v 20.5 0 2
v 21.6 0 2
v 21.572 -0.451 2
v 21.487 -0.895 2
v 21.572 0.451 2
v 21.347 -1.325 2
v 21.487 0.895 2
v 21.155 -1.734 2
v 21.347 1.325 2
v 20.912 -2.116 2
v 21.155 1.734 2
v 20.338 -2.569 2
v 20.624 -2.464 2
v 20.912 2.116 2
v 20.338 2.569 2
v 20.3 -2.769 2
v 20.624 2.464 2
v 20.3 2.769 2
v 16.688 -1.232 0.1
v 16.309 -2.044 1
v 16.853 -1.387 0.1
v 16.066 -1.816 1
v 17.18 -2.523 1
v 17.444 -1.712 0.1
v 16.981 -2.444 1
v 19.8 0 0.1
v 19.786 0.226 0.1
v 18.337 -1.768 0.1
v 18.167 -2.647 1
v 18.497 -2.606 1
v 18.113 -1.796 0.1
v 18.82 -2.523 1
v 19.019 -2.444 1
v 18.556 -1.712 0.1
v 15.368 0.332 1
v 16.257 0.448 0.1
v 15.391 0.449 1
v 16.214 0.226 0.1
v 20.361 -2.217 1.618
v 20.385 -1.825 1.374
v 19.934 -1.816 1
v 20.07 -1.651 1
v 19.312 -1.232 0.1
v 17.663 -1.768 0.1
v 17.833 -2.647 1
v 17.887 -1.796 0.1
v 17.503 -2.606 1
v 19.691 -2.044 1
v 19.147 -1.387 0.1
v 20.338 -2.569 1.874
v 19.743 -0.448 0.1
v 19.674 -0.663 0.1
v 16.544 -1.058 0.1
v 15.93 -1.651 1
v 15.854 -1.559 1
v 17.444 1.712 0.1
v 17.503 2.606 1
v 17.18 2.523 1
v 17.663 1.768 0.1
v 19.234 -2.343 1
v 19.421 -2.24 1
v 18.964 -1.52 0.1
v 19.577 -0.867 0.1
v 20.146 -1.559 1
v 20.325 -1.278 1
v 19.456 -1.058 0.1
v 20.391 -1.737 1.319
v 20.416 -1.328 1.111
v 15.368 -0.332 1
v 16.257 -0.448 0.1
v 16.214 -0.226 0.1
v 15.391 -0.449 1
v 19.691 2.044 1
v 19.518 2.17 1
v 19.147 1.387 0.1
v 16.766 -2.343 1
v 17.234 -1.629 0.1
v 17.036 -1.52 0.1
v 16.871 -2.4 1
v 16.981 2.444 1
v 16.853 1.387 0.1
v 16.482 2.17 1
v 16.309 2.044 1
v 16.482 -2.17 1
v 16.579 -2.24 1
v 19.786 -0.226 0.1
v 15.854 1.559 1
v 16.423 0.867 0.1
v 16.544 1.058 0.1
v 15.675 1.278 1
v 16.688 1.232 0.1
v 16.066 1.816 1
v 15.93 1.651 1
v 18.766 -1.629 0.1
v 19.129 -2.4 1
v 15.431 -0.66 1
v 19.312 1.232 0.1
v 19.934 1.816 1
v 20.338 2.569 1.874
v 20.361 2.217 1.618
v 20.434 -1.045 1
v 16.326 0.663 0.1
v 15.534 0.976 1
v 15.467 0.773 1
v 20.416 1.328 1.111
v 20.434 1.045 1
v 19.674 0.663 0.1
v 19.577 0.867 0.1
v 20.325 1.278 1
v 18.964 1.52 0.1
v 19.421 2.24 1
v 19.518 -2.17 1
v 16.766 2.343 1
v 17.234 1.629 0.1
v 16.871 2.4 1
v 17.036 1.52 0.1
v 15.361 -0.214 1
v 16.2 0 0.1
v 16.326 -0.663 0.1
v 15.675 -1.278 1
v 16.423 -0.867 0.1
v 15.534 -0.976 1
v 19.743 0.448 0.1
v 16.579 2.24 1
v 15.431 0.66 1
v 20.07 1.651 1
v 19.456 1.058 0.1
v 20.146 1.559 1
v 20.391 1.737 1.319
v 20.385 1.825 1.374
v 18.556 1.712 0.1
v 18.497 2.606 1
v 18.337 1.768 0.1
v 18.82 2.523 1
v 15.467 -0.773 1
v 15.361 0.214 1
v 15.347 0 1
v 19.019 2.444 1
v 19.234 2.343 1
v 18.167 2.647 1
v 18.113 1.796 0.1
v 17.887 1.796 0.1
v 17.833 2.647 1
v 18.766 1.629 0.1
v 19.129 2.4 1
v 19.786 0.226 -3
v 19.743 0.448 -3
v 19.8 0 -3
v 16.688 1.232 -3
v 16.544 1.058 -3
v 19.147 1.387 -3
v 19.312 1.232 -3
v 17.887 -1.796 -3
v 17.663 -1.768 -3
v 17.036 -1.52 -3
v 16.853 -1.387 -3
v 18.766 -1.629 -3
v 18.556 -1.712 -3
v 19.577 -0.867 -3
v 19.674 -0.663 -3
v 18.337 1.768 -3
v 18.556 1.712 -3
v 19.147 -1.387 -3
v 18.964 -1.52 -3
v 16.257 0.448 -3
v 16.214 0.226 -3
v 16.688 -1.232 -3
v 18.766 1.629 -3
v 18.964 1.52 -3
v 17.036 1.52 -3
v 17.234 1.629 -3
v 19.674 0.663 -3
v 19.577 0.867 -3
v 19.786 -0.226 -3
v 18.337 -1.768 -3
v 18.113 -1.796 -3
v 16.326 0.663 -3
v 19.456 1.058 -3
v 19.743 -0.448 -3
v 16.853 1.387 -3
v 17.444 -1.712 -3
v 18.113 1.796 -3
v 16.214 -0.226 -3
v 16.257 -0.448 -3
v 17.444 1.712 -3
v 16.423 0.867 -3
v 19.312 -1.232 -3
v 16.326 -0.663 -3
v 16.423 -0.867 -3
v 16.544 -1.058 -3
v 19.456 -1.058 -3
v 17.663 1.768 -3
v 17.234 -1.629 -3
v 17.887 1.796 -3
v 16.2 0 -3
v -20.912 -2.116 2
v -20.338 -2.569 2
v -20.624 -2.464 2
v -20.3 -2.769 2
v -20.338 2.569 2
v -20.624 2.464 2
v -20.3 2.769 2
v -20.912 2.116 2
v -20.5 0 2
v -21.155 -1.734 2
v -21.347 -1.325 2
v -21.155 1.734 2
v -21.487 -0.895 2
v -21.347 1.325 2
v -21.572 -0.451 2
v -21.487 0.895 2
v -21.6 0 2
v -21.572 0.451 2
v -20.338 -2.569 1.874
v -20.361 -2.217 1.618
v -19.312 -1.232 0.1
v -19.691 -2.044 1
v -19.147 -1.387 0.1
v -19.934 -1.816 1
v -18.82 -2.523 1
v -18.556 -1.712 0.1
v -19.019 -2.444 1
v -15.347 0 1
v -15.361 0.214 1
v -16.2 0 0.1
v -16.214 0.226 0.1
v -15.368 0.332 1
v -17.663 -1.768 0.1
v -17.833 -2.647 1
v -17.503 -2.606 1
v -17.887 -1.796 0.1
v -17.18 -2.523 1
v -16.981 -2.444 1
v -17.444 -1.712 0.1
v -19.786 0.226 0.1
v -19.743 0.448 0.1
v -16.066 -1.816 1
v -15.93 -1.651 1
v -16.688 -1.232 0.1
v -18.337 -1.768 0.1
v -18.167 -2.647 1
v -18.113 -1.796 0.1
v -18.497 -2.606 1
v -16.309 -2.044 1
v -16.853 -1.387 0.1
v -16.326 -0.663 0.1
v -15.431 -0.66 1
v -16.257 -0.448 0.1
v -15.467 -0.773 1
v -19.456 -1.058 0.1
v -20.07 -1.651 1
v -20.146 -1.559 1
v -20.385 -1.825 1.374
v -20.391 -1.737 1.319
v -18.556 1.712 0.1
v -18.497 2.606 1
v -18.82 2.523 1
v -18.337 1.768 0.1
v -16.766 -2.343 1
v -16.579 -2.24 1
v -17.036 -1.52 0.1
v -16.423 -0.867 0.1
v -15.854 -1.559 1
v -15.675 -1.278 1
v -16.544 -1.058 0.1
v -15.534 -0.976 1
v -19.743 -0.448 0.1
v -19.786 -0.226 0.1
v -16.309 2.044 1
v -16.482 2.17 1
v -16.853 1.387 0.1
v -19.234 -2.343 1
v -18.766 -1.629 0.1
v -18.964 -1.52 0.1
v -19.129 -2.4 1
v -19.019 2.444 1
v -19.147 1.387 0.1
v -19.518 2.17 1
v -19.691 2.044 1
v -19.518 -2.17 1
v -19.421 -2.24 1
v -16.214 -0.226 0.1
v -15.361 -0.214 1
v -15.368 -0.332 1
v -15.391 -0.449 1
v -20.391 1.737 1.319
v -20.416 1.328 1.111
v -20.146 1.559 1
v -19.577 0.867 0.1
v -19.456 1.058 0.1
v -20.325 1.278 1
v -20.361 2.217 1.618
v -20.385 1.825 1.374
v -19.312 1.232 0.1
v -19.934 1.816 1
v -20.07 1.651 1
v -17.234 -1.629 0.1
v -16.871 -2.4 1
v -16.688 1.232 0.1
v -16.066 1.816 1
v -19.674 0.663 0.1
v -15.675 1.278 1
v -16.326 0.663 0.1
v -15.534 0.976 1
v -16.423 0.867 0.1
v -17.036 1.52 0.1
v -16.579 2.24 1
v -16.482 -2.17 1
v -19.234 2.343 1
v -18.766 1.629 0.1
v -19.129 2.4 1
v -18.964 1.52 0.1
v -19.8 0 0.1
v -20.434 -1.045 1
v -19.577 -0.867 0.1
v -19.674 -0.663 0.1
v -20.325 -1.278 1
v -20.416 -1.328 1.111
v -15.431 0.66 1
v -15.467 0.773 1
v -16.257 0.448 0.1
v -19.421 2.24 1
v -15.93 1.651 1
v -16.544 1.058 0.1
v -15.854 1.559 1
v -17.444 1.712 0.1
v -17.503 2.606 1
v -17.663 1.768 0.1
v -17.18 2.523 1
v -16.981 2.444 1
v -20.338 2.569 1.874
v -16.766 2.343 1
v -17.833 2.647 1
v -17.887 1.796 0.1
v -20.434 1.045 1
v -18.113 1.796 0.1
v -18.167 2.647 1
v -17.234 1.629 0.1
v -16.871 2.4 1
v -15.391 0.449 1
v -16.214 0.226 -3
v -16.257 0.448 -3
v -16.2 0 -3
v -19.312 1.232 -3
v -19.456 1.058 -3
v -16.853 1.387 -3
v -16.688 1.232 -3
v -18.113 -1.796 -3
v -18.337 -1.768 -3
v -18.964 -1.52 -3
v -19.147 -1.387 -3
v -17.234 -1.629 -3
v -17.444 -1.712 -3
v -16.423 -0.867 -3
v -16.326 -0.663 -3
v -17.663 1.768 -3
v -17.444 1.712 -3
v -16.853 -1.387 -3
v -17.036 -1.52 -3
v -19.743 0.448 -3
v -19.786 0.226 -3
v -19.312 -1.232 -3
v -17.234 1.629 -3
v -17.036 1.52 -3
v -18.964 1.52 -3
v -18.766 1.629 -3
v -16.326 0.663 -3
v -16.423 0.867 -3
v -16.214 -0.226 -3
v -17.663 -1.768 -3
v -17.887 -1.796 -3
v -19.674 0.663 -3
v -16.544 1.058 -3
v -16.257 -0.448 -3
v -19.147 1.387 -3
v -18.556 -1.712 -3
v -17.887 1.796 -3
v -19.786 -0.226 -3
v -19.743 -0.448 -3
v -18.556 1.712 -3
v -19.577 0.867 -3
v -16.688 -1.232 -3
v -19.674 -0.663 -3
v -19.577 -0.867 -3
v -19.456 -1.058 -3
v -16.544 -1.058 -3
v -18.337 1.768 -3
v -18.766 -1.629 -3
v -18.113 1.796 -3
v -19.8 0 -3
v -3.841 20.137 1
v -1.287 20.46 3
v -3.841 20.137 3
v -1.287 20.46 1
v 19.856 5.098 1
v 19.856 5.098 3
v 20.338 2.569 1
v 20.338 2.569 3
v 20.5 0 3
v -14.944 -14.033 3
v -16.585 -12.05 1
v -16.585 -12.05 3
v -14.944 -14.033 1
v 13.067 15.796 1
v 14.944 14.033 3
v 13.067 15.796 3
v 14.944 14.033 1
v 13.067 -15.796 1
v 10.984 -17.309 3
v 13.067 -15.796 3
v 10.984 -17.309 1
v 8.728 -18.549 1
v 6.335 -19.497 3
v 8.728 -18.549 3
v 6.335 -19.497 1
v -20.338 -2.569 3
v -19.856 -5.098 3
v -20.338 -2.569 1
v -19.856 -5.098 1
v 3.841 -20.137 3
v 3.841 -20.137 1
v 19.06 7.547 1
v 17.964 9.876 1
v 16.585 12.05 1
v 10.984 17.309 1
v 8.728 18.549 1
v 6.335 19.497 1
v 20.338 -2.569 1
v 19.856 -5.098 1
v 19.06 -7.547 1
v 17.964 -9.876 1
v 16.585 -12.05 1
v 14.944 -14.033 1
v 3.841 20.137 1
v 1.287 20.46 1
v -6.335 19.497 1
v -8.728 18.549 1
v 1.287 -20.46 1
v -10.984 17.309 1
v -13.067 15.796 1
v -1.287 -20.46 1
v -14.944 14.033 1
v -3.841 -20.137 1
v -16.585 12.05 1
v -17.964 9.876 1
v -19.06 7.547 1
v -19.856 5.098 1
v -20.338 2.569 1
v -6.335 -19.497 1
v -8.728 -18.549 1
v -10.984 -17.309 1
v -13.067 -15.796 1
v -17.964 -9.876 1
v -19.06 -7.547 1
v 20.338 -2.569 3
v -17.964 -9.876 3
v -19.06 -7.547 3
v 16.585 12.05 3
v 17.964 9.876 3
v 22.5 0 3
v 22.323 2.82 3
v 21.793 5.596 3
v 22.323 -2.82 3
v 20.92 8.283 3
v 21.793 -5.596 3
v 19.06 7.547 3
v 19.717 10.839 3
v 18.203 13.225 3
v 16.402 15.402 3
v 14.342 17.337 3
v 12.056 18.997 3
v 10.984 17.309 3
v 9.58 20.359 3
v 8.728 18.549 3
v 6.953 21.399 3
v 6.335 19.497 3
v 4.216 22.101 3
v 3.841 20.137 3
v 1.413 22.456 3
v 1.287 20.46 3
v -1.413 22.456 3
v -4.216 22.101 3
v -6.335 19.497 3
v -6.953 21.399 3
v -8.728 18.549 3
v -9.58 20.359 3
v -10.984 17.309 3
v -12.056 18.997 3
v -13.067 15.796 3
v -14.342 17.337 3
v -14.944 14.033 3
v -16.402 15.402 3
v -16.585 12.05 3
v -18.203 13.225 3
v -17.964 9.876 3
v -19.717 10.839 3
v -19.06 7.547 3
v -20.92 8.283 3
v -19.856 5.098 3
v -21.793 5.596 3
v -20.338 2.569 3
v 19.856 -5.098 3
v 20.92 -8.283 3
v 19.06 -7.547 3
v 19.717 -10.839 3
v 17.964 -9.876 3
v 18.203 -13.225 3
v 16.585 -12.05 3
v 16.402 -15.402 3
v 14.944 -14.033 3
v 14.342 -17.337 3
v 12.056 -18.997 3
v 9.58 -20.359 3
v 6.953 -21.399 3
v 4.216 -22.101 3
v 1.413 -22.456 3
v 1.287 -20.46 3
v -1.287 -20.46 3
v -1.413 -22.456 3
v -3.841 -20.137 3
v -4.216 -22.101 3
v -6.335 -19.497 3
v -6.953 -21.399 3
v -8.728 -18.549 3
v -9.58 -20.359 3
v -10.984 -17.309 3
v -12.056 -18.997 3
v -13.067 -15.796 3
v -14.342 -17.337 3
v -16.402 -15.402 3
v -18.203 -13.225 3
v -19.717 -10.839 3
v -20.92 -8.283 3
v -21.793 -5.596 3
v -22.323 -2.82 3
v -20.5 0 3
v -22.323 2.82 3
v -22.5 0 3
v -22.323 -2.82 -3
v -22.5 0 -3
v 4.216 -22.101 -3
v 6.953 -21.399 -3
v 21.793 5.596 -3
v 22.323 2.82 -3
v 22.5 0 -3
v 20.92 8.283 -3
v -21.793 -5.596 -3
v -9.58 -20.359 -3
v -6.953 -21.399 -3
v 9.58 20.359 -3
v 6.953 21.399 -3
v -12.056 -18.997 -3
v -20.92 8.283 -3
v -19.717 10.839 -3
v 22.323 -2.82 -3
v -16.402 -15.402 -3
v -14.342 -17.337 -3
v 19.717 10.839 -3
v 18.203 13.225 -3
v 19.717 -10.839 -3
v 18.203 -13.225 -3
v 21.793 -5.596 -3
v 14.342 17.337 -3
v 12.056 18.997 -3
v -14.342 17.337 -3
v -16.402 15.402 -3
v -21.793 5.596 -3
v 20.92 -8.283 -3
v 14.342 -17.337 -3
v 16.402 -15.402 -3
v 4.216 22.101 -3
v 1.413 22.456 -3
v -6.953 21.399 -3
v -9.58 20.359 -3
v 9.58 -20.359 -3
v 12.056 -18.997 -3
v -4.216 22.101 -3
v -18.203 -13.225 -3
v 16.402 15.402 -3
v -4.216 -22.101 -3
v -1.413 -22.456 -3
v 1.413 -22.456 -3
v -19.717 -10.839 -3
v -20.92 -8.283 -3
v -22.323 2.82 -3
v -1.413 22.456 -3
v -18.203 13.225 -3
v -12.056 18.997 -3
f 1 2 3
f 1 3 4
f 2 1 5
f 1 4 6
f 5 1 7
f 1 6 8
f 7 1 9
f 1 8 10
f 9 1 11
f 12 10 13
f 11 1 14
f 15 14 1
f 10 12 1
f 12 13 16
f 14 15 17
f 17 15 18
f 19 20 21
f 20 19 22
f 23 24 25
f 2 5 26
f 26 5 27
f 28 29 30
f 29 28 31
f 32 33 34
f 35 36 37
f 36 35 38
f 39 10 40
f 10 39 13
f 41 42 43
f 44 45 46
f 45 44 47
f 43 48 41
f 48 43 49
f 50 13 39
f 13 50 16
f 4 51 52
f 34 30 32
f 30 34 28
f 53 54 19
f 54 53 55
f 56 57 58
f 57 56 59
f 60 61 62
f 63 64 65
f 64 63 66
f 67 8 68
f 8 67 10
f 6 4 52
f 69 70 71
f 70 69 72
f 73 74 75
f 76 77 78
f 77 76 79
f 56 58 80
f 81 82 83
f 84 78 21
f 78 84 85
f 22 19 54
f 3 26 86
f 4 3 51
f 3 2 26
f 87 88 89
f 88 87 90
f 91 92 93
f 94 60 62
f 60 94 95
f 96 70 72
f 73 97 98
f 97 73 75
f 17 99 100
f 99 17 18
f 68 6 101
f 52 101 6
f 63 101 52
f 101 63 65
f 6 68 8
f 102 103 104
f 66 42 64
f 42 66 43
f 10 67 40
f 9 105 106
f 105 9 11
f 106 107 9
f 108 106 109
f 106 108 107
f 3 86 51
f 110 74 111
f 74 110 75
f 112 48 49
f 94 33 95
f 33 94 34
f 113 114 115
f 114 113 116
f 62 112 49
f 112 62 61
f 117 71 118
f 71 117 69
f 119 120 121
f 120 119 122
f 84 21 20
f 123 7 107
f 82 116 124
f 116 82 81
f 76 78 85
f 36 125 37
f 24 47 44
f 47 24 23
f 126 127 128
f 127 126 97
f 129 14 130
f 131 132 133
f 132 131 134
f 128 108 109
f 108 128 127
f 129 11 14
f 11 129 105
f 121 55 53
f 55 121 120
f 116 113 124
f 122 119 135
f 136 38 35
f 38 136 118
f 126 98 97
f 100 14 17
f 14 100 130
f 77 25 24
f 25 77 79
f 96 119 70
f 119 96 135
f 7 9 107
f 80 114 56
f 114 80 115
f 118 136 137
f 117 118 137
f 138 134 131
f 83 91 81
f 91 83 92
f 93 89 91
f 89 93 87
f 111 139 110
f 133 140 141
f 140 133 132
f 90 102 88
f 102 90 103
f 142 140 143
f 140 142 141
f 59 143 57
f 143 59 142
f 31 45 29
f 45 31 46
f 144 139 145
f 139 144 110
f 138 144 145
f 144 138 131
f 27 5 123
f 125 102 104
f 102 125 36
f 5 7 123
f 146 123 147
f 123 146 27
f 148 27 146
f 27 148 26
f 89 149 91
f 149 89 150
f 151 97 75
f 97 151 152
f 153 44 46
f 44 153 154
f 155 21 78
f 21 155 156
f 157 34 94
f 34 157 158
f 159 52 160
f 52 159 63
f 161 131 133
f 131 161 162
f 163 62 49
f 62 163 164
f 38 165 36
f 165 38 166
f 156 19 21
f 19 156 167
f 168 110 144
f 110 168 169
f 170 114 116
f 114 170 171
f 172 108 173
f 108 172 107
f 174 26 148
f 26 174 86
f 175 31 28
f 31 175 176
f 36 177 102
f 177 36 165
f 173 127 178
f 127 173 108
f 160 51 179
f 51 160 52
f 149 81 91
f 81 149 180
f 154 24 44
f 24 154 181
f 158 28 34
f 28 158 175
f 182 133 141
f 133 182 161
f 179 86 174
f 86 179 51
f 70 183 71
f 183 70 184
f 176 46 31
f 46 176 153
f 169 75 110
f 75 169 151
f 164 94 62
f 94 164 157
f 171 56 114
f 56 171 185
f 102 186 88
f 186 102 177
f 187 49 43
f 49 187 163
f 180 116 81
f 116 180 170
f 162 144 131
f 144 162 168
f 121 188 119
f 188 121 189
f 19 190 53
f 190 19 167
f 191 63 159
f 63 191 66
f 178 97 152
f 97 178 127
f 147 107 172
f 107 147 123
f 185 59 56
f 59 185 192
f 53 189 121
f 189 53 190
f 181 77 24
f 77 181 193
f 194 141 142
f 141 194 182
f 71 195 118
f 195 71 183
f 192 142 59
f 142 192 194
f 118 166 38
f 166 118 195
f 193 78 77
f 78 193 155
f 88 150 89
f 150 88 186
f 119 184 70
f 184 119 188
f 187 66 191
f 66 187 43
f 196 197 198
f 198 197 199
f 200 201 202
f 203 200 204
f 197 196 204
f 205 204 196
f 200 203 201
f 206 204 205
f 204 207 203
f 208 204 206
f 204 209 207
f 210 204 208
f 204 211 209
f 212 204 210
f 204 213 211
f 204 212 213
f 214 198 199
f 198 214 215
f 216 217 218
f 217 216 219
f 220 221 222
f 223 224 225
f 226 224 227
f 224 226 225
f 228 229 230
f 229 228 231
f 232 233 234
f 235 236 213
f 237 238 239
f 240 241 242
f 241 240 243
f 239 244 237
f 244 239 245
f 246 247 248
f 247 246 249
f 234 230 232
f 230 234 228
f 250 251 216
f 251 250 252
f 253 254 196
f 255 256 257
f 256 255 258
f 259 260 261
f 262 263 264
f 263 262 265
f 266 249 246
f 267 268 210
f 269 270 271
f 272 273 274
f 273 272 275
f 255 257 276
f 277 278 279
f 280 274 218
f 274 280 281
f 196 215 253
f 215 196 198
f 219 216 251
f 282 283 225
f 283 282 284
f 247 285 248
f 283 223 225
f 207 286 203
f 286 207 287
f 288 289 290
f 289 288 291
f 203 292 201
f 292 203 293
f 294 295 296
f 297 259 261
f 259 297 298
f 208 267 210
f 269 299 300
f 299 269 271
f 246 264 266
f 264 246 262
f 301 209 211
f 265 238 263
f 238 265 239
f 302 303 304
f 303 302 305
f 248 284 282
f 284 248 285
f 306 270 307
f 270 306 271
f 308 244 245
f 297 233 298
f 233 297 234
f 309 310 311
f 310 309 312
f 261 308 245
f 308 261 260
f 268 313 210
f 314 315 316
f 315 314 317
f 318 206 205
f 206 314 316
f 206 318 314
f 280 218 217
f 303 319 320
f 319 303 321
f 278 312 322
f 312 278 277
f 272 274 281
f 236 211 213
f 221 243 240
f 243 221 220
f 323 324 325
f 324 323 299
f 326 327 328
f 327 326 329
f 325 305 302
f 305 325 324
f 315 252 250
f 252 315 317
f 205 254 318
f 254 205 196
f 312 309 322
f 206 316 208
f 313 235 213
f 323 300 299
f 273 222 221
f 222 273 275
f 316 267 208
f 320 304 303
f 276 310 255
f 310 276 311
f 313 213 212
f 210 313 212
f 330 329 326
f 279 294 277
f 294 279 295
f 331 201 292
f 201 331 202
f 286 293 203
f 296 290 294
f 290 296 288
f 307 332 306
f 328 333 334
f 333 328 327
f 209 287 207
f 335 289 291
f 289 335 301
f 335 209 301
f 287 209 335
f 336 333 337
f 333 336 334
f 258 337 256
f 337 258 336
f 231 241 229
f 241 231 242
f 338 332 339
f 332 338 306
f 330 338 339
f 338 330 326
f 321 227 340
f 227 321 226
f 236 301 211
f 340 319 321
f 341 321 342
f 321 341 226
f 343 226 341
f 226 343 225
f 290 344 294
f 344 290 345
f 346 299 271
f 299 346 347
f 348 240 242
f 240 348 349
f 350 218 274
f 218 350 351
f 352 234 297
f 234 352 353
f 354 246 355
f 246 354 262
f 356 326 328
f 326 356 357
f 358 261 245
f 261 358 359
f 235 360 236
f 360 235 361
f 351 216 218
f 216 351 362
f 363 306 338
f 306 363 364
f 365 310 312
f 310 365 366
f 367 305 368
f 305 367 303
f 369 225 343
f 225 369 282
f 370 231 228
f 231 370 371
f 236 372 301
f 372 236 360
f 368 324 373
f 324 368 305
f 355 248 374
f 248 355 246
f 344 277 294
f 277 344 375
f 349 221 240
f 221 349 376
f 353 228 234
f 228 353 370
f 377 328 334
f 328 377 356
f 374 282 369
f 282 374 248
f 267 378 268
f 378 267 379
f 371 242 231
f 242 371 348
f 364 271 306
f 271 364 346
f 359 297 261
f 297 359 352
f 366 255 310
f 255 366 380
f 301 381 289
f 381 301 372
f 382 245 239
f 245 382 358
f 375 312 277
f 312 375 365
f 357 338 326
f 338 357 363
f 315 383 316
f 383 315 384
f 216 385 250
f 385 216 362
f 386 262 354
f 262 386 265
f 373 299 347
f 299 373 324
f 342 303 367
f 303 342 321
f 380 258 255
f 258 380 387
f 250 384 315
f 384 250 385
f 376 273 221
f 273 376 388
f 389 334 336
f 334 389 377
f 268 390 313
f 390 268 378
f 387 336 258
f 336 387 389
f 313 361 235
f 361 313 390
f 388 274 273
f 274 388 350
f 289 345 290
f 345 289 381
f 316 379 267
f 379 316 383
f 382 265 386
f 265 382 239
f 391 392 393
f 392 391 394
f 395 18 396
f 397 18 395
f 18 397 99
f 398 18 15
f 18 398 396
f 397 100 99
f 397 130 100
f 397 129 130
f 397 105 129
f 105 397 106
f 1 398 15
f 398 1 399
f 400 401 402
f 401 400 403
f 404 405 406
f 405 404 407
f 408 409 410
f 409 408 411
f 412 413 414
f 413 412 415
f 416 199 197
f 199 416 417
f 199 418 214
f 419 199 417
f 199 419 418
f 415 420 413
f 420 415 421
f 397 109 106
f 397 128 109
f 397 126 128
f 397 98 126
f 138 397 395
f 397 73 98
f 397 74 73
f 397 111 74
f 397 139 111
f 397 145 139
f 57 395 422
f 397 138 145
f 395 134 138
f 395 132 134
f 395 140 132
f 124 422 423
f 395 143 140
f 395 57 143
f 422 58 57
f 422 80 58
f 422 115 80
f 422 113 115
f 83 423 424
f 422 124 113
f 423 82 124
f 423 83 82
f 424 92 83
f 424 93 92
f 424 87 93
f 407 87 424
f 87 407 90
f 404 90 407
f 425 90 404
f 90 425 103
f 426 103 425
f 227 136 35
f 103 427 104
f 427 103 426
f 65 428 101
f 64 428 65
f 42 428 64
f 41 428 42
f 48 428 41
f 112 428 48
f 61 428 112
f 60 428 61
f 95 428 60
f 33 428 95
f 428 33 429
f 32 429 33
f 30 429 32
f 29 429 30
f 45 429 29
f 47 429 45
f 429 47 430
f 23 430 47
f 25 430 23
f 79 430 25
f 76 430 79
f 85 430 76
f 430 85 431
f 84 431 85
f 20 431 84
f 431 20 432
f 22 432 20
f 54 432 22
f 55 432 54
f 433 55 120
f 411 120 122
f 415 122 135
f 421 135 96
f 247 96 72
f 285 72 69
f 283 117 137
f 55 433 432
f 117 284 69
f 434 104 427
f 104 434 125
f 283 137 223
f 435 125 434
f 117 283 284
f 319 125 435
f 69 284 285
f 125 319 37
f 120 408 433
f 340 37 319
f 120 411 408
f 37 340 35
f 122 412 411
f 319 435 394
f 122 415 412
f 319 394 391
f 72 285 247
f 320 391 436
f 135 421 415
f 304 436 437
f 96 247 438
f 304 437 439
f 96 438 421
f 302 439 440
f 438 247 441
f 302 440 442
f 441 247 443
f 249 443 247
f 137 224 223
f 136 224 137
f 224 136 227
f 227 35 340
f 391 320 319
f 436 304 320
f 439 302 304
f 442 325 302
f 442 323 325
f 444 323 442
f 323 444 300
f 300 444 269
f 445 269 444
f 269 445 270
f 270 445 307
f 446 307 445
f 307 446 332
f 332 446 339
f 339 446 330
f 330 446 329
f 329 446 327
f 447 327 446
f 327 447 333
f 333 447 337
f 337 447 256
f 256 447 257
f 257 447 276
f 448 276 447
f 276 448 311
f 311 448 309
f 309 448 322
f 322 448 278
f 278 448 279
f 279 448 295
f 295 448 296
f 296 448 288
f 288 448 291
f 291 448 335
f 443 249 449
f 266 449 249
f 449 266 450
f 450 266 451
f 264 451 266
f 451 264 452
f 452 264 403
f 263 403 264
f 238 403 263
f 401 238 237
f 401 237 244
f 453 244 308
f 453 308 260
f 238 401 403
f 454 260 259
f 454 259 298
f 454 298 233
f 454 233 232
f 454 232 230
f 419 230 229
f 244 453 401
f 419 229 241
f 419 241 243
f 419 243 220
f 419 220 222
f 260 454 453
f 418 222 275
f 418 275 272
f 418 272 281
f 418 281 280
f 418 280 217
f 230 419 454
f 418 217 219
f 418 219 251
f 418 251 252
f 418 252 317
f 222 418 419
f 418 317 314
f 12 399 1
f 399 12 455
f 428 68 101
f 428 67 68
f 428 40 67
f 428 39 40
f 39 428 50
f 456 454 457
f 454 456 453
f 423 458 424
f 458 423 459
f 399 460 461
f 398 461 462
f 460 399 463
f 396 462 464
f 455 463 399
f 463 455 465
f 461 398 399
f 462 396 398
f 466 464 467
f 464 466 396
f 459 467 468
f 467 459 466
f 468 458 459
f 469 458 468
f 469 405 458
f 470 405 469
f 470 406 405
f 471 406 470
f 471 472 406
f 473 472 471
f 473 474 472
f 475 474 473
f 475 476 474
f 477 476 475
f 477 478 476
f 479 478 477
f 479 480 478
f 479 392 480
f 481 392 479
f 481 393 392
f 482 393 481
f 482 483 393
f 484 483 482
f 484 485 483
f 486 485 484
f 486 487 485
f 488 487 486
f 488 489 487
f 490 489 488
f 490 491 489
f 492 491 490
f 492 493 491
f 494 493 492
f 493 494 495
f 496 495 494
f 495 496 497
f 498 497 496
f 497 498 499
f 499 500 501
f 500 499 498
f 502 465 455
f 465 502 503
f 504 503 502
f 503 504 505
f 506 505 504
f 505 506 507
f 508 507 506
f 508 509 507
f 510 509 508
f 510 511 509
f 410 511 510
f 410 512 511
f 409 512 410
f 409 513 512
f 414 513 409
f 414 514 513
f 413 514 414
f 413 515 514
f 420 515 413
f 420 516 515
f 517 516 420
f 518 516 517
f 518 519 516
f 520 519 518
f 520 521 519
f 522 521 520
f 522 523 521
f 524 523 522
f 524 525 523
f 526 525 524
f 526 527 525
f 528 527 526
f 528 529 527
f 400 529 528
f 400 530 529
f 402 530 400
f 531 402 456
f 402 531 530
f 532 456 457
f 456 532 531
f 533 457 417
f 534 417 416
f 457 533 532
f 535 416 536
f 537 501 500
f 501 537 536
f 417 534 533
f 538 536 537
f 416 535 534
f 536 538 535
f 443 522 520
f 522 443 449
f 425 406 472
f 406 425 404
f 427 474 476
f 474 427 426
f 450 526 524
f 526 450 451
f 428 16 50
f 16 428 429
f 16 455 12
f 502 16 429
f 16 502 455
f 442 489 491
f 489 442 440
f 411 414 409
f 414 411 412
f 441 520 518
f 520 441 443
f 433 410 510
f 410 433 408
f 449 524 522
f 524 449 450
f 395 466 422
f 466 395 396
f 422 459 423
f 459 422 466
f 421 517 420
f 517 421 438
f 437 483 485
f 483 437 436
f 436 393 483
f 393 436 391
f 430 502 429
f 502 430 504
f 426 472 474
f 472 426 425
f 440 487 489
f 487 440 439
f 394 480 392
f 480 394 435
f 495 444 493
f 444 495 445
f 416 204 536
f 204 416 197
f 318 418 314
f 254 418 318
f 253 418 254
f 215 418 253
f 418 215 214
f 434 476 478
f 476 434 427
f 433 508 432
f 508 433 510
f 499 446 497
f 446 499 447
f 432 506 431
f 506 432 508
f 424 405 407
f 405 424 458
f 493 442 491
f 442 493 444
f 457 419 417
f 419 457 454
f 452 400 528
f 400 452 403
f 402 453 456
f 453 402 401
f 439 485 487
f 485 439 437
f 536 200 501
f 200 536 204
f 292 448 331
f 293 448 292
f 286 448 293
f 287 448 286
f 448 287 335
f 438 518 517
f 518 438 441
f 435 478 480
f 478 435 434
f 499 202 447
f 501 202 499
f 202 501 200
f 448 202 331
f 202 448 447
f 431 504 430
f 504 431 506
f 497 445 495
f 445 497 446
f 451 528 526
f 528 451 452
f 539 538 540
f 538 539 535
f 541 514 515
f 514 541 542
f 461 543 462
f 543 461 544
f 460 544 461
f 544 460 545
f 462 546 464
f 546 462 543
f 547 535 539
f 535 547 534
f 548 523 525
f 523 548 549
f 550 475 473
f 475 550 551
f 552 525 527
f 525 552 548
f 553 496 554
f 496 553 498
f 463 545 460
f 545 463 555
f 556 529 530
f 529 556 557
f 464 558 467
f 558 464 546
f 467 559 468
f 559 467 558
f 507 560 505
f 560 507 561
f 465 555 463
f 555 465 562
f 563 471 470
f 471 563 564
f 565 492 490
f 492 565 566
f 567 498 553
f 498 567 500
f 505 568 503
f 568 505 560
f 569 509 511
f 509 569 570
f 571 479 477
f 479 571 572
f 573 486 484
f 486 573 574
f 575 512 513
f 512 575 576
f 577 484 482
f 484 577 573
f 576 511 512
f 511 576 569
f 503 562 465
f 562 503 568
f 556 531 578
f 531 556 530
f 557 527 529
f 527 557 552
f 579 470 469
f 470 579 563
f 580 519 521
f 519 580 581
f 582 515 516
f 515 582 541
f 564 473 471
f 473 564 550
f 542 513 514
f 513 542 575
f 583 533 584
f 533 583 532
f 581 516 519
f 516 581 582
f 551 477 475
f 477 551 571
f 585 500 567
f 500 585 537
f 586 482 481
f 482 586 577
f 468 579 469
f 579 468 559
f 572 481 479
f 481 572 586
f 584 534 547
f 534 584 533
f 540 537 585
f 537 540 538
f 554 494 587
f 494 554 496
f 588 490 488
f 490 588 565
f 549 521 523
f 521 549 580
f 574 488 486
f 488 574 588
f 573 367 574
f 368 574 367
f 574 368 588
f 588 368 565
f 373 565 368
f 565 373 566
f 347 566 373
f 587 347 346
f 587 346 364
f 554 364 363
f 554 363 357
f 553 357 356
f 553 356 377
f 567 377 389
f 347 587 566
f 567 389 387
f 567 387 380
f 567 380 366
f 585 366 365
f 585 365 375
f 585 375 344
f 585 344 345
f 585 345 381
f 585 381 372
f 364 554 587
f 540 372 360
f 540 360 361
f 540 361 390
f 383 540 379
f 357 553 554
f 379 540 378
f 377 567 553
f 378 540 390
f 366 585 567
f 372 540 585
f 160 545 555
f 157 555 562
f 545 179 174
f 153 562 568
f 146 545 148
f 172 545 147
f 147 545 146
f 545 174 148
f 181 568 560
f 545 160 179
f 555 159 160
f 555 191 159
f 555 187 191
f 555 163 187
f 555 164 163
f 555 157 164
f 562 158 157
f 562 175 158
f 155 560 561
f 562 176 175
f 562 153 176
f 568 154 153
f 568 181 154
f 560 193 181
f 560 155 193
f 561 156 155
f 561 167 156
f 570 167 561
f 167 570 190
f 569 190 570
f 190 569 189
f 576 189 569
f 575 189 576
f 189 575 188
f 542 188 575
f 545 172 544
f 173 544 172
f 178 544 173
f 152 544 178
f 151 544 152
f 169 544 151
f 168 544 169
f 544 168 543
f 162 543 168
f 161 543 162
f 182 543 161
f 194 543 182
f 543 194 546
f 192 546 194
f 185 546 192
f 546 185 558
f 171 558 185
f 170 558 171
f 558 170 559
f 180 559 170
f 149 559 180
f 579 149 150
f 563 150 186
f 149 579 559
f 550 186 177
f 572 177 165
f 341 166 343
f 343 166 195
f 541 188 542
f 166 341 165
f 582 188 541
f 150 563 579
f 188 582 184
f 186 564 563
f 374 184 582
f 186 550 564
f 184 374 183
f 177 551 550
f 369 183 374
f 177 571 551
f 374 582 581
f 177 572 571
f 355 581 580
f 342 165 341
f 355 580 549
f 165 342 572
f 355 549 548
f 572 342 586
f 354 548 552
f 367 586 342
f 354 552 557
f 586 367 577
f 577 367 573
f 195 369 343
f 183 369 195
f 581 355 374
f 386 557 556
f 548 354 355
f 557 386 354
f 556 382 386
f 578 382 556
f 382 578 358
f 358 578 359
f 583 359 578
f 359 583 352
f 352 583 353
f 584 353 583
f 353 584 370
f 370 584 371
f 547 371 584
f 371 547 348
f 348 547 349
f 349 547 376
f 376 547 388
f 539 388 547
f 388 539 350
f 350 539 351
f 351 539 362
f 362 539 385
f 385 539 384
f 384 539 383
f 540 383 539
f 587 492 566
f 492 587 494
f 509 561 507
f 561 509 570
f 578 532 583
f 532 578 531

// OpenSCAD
$fn = 50;


difference() {
	union() {
		translate(v = [0, 0, -3.0000000000]) {
			cylinder(h = 6, r = 22.5000000000);
		}
	}
	union() {
		translate(v = [18.0000000000, 0, 2.0000000000]) {
			rotate(a = [0, 0, 0]) {
				difference() {
					union() {
						translate(v = [0, 0, -10.0000000000]) {
							rotate(a = [0, 0, 0]) {
								difference() {
									union() {
										#translate(v = [-1.7500000000, -3.2500000000, -0.3000000000]) {
											cube(size = [3.5000000000, 6.5000000000, 0.3000000000]);
										}
										#translate(v = [-1.7500000000, -1.7500000000, -0.6000000000]) {
											cube(size = [3.5000000000, 3.5000000000, 0.3000000000]);
										}
										#translate(v = [-1.7500000000, -3.2500000000, 2.5000000000]) {
											cube(size = [3.5000000000, 6.5000000000, 0.3000000000]);
										}
										#translate(v = [-1.7500000000, -1.7500000000, 2.8000000000]) {
											cube(size = [3.5000000000, 3.5000000000, 0.3000000000]);
										}
										#linear_extrude(height = 2.5000000000) {
											polygon(points = [[3.4620000000, 0.0000000000], [1.7310000000, 2.9981799479], [-1.7310000000, 2.9981799479], [-3.4620000000, 0.0000000000], [-1.7310000000, -2.9981799479], [1.7310000000, -2.9981799479]]);
										}
										#translate(v = [-1.7500000000, -3.2500000000, -0.3000000000]) {
											cube(size = [3.5000000000, 6.5000000000, 0.3000000000]);
										}
										#translate(v = [-1.7500000000, -1.7500000000, -0.6000000000]) {
											cube(size = [3.5000000000, 3.5000000000, 0.3000000000]);
										}
										#translate(v = [-1.7500000000, -3.2500000000, 2.5000000000]) {
											cube(size = [3.5000000000, 6.5000000000, 0.3000000000]);
										}
										#translate(v = [-1.7500000000, -1.7500000000, 2.8000000000]) {
											cube(size = [3.5000000000, 3.5000000000, 0.3000000000]);
										}
										#translate(v = [-1.7500000000, -3.2500000000, -0.3000000000]) {
											cube(size = [3.5000000000, 6.5000000000, 0.3000000000]);
										}
										#translate(v = [-1.7500000000, -1.7500000000, -0.6000000000]) {
											cube(size = [3.5000000000, 3.5000000000, 0.3000000000]);
										}
										#translate(v = [-1.7500000000, -3.2500000000, 2.5000000000]) {
											cube(size = [3.5000000000, 6.5000000000, 0.3000000000]);
										}
										#translate(v = [-1.7500000000, -1.7500000000, 2.8000000000]) {
											cube(size = [3.5000000000, 3.5000000000, 0.3000000000]);
										}
									}
									union();
								}
							}
						}
						translate(v = [0, 0, -10.0000000000]) {
							rotate(a = [0, 0, 0]) {
								difference() {
									union() {
										#translate(v = [-1.7500000000, -3.2500000000, -0.3000000000]) {
											cube(size = [3.5000000000, 6.5000000000, 0.3000000000]);
										}
										#translate(v = [-1.7500000000, -1.7500000000, -0.6000000000]) {
											cube(size = [3.5000000000, 3.5000000000, 0.3000000000]);
										}
										#translate(v = [-1.7500000000, -3.2500000000, 2.5000000000]) {
											cube(size = [3.5000000000, 6.5000000000, 0.3000000000]);
										}
										#translate(v = [-1.7500000000, -1.7500000000, 2.8000000000]) {
											cube(size = [3.5000000000, 3.5000000000, 0.3000000000]);
										}
										#linear_extrude(height = 2.5000000000) {
											polygon(points = [[3.4620000000, 0.0000000000], [1.7310000000, 2.9981799479], [-1.7310000000, 2.9981799479], [-3.4620000000, 0.0000000000], [-1.7310000000, -2.9981799479], [1.7310000000, -2.9981799479]]);
										}
										#translate(v = [-1.7500000000, -3.2500000000, -0.3000000000]) {
											cube(size = [3.5000000000, 6.5000000000, 0.3000000000]);
										}
										#translate(v = [-1.7500000000, -1.7500000000, -0.6000000000]) {
											cube(size = [3.5000000000, 3.5000000000, 0.3000000000]);
										}
										#translate(v = [-1.7500000000, -3.2500000000, 2.5000000000]) {
											cube(size = [3.5000000000, 6.5000000000, 0.3000000000]);
										}
										#translate(v = [-1.7500000000, -1.7500000000, 2.8000000000]) {
											cube(size = [3.5000000000, 3.5000000000, 0.3000000000]);
										}
										#translate(v = [-1.7500000000, -3.2500000000, -0.3000000000]) {
											cube(size = [3.5000000000, 6.5000000000, 0.3000000000]);
										}
										#translate(v = [-1.7500000000, -1.7500000000, -0.6000000000]) {
											cube(size = [3.5000000000, 3.5000000000, 0.3000000000]);
										}
										#translate(v = [-1.7500000000, -3.2500000000, 2.5000000000]) {
											cube(size = [3.5000000000, 6.5000000000, 0.3000000000]);
										}
										#translate(v = [-1.7500000000, -1.7500000000, 2.8000000000]) {
											cube(size = [3.5000000000, 3.5000000000, 0.3000000000]);
										}
									}
									union();
								}
							}
						}
						translate(v = [0, 0, -10.0000000000]) {
							rotate(a = [0, 0, 0]) {
								difference() {
									union() {
										#translate(v = [-1.7500000000, -3.2500000000, -0.3000000000]) {
											cube(size = [3.5000000000, 6.5000000000, 0.3000000000]);
										}
										#translate(v = [-1.7500000000, -1.7500000000, -0.6000000000]) {
											cube(size = [3.5000000000, 3.5000000000, 0.3000000000]);
										}
										#translate(v = [-1.7500000000, -3.2500000000, 2.5000000000]) {
											cube(size = [3.5000000000, 6.5000000000, 0.3000000000]);
										}
										#translate(v = [-1.7500000000, -1.7500000000, 2.8000000000]) {
											cube(size = [3.5000000000, 3.5000000000, 0.3000000000]);
										}
										#linear_extrude(height = 2.5000000000) {
											polygon(points = [[3.4620000000, 0.0000000000], [1.7310000000, 2.9981799479], [-1.7310000000, 2.9981799479], [-3.4620000000, 0.0000000000], [-1.7310000000, -2.9981799479], [1.7310000000, -2.9981799479]]);
										}
										#translate(v = [-1.7500000000, -3.2500000000, -0.3000000000]) {
											cube(size = [3.5000000000, 6.5000000000, 0.3000000000]);
										}
										#translate(v = [-1.7500000000, -1.7500000000, -0.6000000000]) {
											cube(size = [3.5000000000, 3.5000000000, 0.3000000000]);
										}
										#translate(v = [-1.7500000000, -3.2500000000, 2.5000000000]) {
											cube(size = [3.5000000000, 6.5000000000, 0.3000000000]);
										}
										#translate(v = [-1.7500000000, -1.7500000000, 2.8000000000]) {
											cube(size = [3.5000000000, 3.5000000000, 0.3000000000]);
										}
										#translate(v = [-1.7500000000, -3.2500000000, -0.3000000000]) {
											cube(size = [3.5000000000, 6.5000000000, 0.3000000000]);
										}
										#translate(v = [-1.7500000000, -1.7500000000, -0.6000000000]) {
											cube(size = [3.5000000000, 3.5000000000, 0.3000000000]);
										}
										#translate(v = [-1.7500000000, -3.2500000000, 2.5000000000]) {
											cube(size = [3.5000000000, 6.5000000000, 0.3000000000]);
										}
										#translate(v = [-1.7500000000, -1.7500000000, 2.8000000000]) {
											cube(size = [3.5000000000, 3.5000000000, 0.3000000000]);
										}
									}
									union();
								}
							}
						}
						#translate(v = [0, 0, -10.0000000000]) {
							cylinder(h = 10, r = 1.5000000000);
						}
						#translate(v = [0, 0, -1.9000000000]) {
							cylinder(h = 1.9000000000, r1 = 1.8000000000, r2 = 3.6000000000);
						}
						#translate(v = [0, 0, -10.0000000000]) {
							cylinder(h = 10, r = 1.8000000000);
						}
						#translate(v = [0, 0, -10.0000000000]) {
							cylinder(h = 10, r = 1.5000000000);
						}
					}
					union();
				}
			}
		}
		translate(v = [-18.0000000000, 0, 2.0000000000]) {
			rotate(a = [0, 0, 0]) {
				difference() {
					union() {
						translate(v = [0, 0, -10.0000000000]) {
							rotate(a = [0, 0, 0]) {
								difference() {
									union() {
										#translate(v = [-1.7500000000, -3.2500000000, -0.3000000000]) {
											cube(size = [3.5000000000, 6.5000000000, 0.3000000000]);
										}
										#translate(v = [-1.7500000000, -1.7500000000, -0.6000000000]) {
											cube(size = [3.5000000000, 3.5000000000, 0.3000000000]);
										}
										#translate(v = [-1.7500000000, -3.2500000000, 2.5000000000]) {
											cube(size = [3.5000000000, 6.5000000000, 0.3000000000]);
										}
										#translate(v = [-1.7500000000, -1.7500000000, 2.8000000000]) {
											cube(size = [3.5000000000, 3.5000000000, 0.3000000000]);
										}
										#linear_extrude(height = 2.5000000000) {
											polygon(points = [[3.4620000000, 0.0000000000], [1.7310000000, 2.9981799479], [-1.7310000000, 2.9981799479], [-3.4620000000, 0.0000000000], [-1.7310000000, -2.9981799479], [1.7310000000, -2.9981799479]]);
										}
										#translate(v = [-1.7500000000, -3.2500000000, -0.3000000000]) {
											cube(size = [3.5000000000, 6.5000000000, 0.3000000000]);
										}
										#translate(v = [-1.7500000000, -1.7500000000, -0.6000000000]) {
											cube(size = [3.5000000000, 3.5000000000, 0.3000000000]);
										}
										#translate(v = [-1.7500000000, -3.2500000000, 2.5000000000]) {
											cube(size = [3.5000000000, 6.5000000000, 0.3000000000]);
										}
										#translate(v = [-1.7500000000, -1.7500000000, 2.8000000000]) {
											cube(size = [3.5000000000, 3.5000000000, 0.3000000000]);
										}
										#translate(v = [-1.7500000000, -3.2500000000, -0.3000000000]) {
											cube(size = [3.5000000000, 6.5000000000, 0.3000000000]);
										}
										#translate(v = [-1.7500000000, -1.7500000000, -0.6000000000]) {
											cube(size = [3.5000000000, 3.5000000000, 0.3000000000]);
										}
										#translate(v = [-1.7500000000, -3.2500000000, 2.5000000000]) {
											cube(size = [3.5000000000, 6.5000000000, 0.3000000000]);
										}
										#translate(v = [-1.7500000000, -1.7500000000, 2.8000000000]) {
											cube(size = [3.5000000000, 3.5000000000, 0.3000000000]);
										}
									}
									union();
								}
							}
						}
						translate(v = [0, 0, -10.0000000000]) {
							rotate(a = [0, 0, 0]) {
								difference() {
									union() {
										#translate(v = [-1.7500000000, -3.2500000000, -0.3000000000]) {
											cube(size = [3.5000000000, 6.5000000000, 0.3000000000]);
										}
										#translate(v = [-1.7500000000, -1.7500000000, -0.6000000000]) {
											cube(size = [3.5000000000, 3.5000000000, 0.3000000000]);
										}
										#translate(v = [-1.7500000000, -3.2500000000, 2.5000000000]) {
											cube(size = [3.5000000000, 6.5000000000, 0.3000000000]);
										}
										#translate(v = [-1.7500000000, -1.7500000000, 2.8000000000]) {
											cube(size = [3.5000000000, 3.5000000000, 0.3000000000]);
										}
										#linear_extrude(height = 2.5000000000) {
											polygon(points = [[3.4620000000, 0.0000000000], [1.7310000000, 2.9981799479], [-1.7310000000, 2.9981799479], [-3.4620000000, 0.0000000000], [-1.7310000000, -2.9981799479], [1.7310000000, -2.9981799479]]);
										}
										#translate(v = [-1.7500000000, -3.2500000000, -0.3000000000]) {
											cube(size = [3.5000000000, 6.5000000000, 0.3000000000]);
										}
										#translate(v = [-1.7500000000, -1.7500000000, -0.6000000000]) {
											cube(size = [3.5000000000, 3.5000000000, 0.3000000000]);
										}
										#translate(v = [-1.7500000000, -3.2500000000, 2.5000000000]) {
											cube(size = [3.5000000000, 6.5000000000, 0.3000000000]);
										}
										#translate(v = [-1.7500000000, -1.7500000000, 2.8000000000]) {
											cube(size = [3.5000000000, 3.5000000000, 0.3000000000]);
										}
										#translate(v = [-1.7500000000, -3.2500000000, -0.3000000000]) {
											cube(size = [3.5000000000, 6.5000000000, 0.3000000000]);
										}
										#translate(v = [-1.7500000000, -1.7500000000, -0.6000000000]) {
											cube(size = [3.5000000000, 3.5000000000, 0.3000000000]);
										}
										#translate(v = [-1.7500000000, -3.2500000000, 2.5000000000]) {
											cube(size = [3.5000000000, 6.5000000000, 0.3000000000]);
										}
										#translate(v = [-1.7500000000, -1.7500000000, 2.8000000000]) {
											cube(size = [3.5000000000, 3.5000000000, 0.3000000000]);
										}
									}
									union();
								}
							}
						}
						translate(v = [0, 0, -10.0000000000]) {
							rotate(a = [0, 0, 0]) {
								difference() {
									union() {
										#translate(v = [-1.7500000000, -3.2500000000, -0.3000000000]) {
											cube(size = [3.5000000000, 6.5000000000, 0.3000000000]);
										}
										#translate(v = [-1.7500000000, -1.7500000000, -0.6000000000]) {
											cube(size = [3.5000000000, 3.5000000000, 0.3000000000]);
										}
										#translate(v = [-1.7500000000, -3.2500000000, 2.5000000000]) {
											cube(size = [3.5000000000, 6.5000000000, 0.3000000000]);
										}
										#translate(v = [-1.7500000000, -1.7500000000, 2.8000000000]) {
											cube(size = [3.5000000000, 3.5000000000, 0.3000000000]);
										}
										#linear_extrude(height = 2.5000000000) {
											polygon(points = [[3.4620000000, 0.0000000000], [1.7310000000, 2.9981799479], [-1.7310000000, 2.9981799479], [-3.4620000000, 0.0000000000], [-1.7310000000, -2.9981799479], [1.7310000000, -2.9981799479]]);
										}
										#translate(v = [-1.7500000000, -3.2500000000, -0.3000000000]) {
											cube(size = [3.5000000000, 6.5000000000, 0.3000000000]);
										}
										#translate(v = [-1.7500000000, -1.7500000000, -0.6000000000]) {
											cube(size = [3.5000000000, 3.5000000000, 0.3000000000]);
										}
										#translate(v = [-1.7500000000, -3.2500000000, 2.5000000000]) {
											cube(size = [3.5000000000, 6.5000000000, 0.3000000000]);
										}
										#translate(v = [-1.7500000000, -1.7500000000, 2.8000000000]) {
											cube(size = [3.5000000000, 3.5000000000, 0.3000000000]);
										}
										#translate(v = [-1.7500000000, -3.2500000000, -0.3000000000]) {
											cube(size = [3.5000000000, 6.5000000000, 0.3000000000]);
										}
										#translate(v = [-1.7500000000, -1.7500000000, -0.6000000000]) {
											cube(size = [3.5000000000, 3.5000000000, 0.3000000000]);
										}
										#translate(v = [-1.7500000000, -3.2500000000, 2.5000000000]) {
											cube(size = [3.5000000000, 6.5000000000, 0.3000000000]);
										}
										#translate(v = [-1.7500000000, -1.7500000000, 2.8000000000]) {
											cube(size = [3.5000000000, 3.5000000000, 0.3000000000]);
										}
									}
									union();
								}
							}
						}
						#translate(v = [0, 0, -10.0000000000]) {
							cylinder(h = 10, r = 1.5000000000);
						}
						#translate(v = [0, 0, -1.9000000000]) {
							cylinder(h = 1.9000000000, r1 = 1.8000000000, r2 = 3.6000000000);
						}
						#translate(v = [0, 0, -10.0000000000]) {
							cylinder(h = 10, r = 1.8000000000);
						}
						#translate(v = [0, 0, -10.0000000000]) {
							cylinder(h = 10, r = 1.5000000000);
						}
					}
					union();
				}
			}
		}
		translate(v = [0, 0, 1.0000000000]) {
			cylinder(h = 2, r = 20.5000000000);
		}
	}
}
